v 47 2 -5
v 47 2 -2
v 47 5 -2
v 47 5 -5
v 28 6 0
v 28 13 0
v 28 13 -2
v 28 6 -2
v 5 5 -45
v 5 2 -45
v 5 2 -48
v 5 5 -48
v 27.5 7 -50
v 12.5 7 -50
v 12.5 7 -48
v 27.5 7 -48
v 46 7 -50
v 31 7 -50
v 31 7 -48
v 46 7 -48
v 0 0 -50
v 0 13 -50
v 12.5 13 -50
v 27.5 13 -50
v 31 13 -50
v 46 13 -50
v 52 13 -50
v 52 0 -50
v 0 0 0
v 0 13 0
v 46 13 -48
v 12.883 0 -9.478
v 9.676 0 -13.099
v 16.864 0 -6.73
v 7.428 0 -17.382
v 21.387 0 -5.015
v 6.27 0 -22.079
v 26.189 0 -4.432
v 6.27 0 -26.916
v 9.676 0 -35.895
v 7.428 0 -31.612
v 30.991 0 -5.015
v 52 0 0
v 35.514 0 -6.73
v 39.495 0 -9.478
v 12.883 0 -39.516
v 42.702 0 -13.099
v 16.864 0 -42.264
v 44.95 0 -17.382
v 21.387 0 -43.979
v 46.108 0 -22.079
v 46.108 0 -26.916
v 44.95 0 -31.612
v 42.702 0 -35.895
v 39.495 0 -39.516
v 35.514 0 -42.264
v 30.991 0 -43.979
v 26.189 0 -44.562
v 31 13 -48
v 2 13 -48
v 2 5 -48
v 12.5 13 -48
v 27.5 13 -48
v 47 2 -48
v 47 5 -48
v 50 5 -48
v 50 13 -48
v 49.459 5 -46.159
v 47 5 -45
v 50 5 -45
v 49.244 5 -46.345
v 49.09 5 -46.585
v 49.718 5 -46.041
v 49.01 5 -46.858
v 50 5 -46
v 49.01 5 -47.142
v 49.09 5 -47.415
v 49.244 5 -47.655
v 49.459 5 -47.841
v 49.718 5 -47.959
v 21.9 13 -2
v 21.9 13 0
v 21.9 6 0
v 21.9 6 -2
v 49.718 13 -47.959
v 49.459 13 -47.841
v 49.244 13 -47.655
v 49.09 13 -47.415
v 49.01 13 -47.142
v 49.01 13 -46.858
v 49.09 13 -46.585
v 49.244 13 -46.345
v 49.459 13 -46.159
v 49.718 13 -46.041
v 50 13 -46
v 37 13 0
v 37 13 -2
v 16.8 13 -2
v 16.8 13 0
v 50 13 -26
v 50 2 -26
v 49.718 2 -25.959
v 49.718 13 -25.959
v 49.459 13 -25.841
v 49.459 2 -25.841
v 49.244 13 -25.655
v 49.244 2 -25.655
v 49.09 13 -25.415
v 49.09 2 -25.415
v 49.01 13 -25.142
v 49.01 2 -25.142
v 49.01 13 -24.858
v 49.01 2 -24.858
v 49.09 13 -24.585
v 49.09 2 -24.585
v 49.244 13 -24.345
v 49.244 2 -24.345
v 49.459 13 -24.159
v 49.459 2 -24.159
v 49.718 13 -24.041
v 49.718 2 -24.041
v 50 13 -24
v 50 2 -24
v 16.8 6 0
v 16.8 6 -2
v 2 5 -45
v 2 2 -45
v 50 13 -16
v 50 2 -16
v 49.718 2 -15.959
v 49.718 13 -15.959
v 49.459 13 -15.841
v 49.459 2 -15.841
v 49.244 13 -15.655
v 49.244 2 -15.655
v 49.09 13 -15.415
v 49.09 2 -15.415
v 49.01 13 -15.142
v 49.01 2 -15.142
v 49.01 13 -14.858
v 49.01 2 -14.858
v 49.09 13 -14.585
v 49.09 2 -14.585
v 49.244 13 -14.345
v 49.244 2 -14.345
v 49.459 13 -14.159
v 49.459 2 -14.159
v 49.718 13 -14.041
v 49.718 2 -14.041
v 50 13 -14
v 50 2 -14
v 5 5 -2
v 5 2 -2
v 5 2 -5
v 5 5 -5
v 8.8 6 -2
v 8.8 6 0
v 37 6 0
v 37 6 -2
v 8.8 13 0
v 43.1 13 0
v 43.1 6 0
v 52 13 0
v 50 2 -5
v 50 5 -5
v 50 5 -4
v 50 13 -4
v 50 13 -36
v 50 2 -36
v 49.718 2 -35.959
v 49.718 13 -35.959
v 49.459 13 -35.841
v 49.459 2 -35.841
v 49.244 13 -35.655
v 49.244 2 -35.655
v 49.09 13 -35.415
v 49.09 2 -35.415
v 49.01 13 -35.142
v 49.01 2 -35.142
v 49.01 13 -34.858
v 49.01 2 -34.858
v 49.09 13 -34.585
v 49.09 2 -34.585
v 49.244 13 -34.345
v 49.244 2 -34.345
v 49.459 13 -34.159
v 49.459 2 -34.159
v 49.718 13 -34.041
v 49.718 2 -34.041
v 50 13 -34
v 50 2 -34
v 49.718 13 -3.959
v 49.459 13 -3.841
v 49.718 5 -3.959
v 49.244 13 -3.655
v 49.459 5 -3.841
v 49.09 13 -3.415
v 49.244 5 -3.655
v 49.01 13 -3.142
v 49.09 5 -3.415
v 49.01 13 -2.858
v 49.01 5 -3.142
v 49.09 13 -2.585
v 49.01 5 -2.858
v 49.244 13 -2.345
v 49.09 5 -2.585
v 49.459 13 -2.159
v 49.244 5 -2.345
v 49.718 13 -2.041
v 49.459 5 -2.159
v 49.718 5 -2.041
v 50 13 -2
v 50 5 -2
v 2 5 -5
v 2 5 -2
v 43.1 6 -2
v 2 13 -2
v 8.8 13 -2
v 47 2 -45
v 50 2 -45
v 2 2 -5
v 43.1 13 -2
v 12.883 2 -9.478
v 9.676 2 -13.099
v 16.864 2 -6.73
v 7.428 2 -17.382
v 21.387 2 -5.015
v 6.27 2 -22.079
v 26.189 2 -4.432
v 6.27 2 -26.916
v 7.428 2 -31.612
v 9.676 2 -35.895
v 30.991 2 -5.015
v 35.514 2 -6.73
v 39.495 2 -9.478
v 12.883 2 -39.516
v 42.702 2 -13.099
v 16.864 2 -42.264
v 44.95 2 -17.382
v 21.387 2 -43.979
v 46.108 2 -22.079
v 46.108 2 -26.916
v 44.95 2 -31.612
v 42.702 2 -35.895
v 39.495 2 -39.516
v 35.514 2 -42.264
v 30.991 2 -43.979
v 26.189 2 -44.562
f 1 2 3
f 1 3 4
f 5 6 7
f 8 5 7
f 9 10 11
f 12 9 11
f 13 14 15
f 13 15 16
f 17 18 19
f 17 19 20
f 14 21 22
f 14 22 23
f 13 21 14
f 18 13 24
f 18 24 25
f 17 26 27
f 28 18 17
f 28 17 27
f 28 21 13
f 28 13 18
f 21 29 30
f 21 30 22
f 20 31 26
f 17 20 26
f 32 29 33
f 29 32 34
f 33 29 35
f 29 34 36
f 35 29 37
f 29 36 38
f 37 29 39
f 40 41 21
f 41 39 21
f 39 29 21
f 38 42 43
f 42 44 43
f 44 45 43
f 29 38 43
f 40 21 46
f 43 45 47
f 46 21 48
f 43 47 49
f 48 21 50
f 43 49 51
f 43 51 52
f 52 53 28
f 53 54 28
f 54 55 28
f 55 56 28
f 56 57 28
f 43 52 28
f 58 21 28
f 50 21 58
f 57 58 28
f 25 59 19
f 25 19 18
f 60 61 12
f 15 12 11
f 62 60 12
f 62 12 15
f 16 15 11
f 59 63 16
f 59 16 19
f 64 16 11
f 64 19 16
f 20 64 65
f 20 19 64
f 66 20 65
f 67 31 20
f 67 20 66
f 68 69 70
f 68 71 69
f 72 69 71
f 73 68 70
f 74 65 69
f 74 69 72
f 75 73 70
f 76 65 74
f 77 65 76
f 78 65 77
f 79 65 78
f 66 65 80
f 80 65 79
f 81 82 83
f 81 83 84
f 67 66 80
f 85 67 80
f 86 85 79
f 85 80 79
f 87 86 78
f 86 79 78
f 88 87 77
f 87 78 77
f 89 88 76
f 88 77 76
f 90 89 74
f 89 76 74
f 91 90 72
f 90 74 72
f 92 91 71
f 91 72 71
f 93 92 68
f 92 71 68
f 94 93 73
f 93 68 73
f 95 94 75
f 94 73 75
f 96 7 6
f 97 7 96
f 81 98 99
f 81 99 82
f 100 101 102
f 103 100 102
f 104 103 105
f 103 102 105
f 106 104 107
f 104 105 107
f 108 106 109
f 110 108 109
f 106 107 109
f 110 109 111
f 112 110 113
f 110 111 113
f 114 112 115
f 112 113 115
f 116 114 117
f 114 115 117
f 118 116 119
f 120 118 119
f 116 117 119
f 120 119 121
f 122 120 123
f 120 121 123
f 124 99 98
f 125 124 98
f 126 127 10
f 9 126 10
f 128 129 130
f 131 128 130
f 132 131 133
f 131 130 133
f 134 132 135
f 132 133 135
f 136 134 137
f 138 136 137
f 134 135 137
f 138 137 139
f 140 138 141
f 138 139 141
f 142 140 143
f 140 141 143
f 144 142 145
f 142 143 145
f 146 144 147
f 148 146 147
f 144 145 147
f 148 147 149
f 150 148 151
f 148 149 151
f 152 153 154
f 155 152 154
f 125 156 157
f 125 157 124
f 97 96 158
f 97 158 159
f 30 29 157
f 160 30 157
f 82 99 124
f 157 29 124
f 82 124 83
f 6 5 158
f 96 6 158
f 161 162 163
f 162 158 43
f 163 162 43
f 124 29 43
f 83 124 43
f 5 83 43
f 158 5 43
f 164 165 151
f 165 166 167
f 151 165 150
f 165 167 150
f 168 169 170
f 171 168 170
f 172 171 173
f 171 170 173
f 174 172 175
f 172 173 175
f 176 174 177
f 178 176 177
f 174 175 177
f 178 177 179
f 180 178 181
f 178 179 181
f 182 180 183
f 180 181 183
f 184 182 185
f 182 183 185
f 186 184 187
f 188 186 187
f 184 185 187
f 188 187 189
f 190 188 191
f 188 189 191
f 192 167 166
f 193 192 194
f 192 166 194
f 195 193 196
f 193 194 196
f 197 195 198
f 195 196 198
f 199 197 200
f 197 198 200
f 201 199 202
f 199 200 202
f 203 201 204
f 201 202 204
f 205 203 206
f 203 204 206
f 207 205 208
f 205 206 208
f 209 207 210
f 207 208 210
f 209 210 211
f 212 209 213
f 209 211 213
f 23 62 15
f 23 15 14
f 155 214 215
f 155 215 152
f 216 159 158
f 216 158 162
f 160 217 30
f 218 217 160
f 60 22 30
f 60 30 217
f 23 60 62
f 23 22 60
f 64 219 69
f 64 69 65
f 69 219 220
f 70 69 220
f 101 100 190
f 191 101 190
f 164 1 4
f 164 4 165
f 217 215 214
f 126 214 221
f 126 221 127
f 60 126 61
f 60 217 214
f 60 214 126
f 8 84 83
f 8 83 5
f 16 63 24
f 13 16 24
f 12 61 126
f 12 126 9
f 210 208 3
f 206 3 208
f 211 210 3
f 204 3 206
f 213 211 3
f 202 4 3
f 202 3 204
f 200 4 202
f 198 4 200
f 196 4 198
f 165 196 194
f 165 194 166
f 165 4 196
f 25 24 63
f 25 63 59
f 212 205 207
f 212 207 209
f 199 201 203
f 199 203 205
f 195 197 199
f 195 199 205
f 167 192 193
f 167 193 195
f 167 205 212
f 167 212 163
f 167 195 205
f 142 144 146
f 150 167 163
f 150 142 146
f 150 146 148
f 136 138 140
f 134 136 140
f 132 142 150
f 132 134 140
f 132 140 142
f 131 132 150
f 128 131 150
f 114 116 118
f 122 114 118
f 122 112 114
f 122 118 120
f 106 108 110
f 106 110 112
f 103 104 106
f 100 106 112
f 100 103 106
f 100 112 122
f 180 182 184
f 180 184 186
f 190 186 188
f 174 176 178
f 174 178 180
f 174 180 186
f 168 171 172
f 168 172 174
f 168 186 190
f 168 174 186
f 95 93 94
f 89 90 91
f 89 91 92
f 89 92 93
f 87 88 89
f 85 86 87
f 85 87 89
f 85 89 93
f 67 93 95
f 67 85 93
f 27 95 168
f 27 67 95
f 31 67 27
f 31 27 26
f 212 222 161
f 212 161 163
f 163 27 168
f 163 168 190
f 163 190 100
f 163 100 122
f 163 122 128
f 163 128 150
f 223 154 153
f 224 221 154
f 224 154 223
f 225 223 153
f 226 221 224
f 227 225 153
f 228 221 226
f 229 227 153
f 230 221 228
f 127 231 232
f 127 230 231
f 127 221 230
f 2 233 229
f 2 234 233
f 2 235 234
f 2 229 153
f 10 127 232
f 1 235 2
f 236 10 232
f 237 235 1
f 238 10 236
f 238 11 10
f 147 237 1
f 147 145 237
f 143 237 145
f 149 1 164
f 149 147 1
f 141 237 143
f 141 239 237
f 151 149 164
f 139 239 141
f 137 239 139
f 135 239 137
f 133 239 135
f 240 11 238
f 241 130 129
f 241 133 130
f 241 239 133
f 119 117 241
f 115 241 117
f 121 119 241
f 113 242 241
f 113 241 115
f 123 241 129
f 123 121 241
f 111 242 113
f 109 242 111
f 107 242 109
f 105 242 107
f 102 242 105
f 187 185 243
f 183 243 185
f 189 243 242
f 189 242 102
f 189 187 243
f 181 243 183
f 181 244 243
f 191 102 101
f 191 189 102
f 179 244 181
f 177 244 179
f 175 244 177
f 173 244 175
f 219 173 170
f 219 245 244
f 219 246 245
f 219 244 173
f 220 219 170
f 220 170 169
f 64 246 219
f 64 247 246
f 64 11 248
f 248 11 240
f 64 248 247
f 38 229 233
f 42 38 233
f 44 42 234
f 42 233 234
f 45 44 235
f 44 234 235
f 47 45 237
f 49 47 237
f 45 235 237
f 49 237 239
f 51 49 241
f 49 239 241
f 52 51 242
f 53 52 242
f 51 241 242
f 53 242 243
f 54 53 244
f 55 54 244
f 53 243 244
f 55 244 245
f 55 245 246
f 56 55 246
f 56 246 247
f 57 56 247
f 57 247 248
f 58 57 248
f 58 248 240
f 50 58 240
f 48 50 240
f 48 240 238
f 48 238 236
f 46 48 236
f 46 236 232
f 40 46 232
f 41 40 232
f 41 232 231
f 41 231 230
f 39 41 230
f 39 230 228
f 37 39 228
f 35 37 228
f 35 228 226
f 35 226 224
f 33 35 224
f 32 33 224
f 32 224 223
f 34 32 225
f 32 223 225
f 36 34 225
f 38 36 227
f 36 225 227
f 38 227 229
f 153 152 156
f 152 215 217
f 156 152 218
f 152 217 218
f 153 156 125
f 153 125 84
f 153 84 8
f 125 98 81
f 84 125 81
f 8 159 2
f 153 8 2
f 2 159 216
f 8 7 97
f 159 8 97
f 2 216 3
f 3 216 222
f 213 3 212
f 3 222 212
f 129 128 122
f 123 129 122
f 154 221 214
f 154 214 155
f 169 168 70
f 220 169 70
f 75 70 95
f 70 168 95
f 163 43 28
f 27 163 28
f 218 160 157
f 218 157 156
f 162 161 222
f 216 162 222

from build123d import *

# Parameters (mm, degrees)
SKETCH1_W           = 52
SKETCH1_H           = 50
BOSS_EXTRUDE1_DEPTH = 13
SKETCH2_W           = 48
SKETCH2_H           = 46
CUT_EXTRUDE1_DEPTH  = 11
SKETCH3_W           = 6.1
SKETCH3_H           = 2
SKETCH3_W_2         = 8
CUT_EXTRUDE2_DEPTH  = 7
SKETCH4_W           = 3
SKETCH4_H           = 3
BOSS_EXTRUDE2_DEPTH = 3
SKETCH5_R           = 1
BOSS_EXTRUDE3_DEPTH = 11
SKETCH13_W          = 15
SKETCH13_H          = 2
CUT_EXTRUDE4_DEPTH  = 6
SKETCH12_R          = 20.065170359
CUT_EXTRUDE3_DEPTH  = 10


with BuildPart() as part:
    # Sketch1 → Boss-Extrude1 (new body)
    with BuildSketch(Plane(origin=(0, 0, 0), x_dir=(1, 0, 0), z_dir=(0, 1, 0))):
        with Locations((26, 25)):
            Rectangle(SKETCH1_W, SKETCH1_H)
    extrude(amount=BOSS_EXTRUDE1_DEPTH)

    # Sketch2 → Cut-Extrude1 (cut)
    with BuildSketch(Plane(origin=(0, 13, 0), x_dir=(1, 0, 0), z_dir=(0, 1, 0))):
        with Locations((26, 25)):
            Rectangle(SKETCH2_W, SKETCH2_H)
    extrude(amount=-CUT_EXTRUDE1_DEPTH, mode=Mode.SUBTRACT)

    # Sketch3 → Cut-Extrude2 (cut)
    with BuildSketch(Plane(origin=(0, 13, 0), x_dir=(1, 0, 0), z_dir=(0, 1, 0))):
        with Locations((40.05, 1)):
            Rectangle(SKETCH3_W, SKETCH3_H)
        with Locations((24.95, 1)):
            Rectangle(SKETCH3_W, SKETCH3_H)
        with Locations((12.8, 1)):
            Rectangle(SKETCH3_W_2, SKETCH3_H)
    extrude(amount=-CUT_EXTRUDE2_DEPTH, mode=Mode.SUBTRACT)

    # Sketch4 → Boss-Extrude2 (add)
    with BuildSketch(Plane(origin=(0, 2, 0), x_dir=(1, 0, 0), z_dir=(0, 1, 0))):
        with Locations((3.5, 46.5)):
            Rectangle(SKETCH4_W, SKETCH4_H)
        with Locations((48.5, 46.5)):
            Rectangle(SKETCH4_W, SKETCH4_H)
        with Locations((3.5, 3.5)):
            Rectangle(SKETCH4_W, SKETCH4_H)
        with Locations((48.5, 3.5)):
            Rectangle(SKETCH4_W, SKETCH4_H)
    extrude(amount=BOSS_EXTRUDE2_DEPTH)

    # Sketch5 → Boss-Extrude3 (add)
    with BuildSketch(Plane(origin=(0, 2, 0), x_dir=(1, 0, 0), z_dir=(0, 1, 0))):
        with Locations((50, 35)):
            Circle(SKETCH5_R)
        with Locations((50, 25)):
            Circle(SKETCH5_R)
        with Locations((50, 15)):
            Circle(SKETCH5_R)
        with Locations((50, 47)):
            Circle(SKETCH5_R)
        with Locations((50, 3)):
            Circle(SKETCH5_R)
    extrude(amount=BOSS_EXTRUDE3_DEPTH)

    # Sketch13 → Cut-Extrude4 (cut)
    with BuildSketch(Plane(origin=(0, 13, 0), x_dir=(1, 0, 0), z_dir=(0, 1, 0))):
        with Locations((38.5, 49)):
            Rectangle(SKETCH13_W, SKETCH13_H)
        with Locations((20, 49)):
            Rectangle(SKETCH13_W, SKETCH13_H)
    extrude(amount=-CUT_EXTRUDE4_DEPTH, mode=Mode.SUBTRACT)

    # Sketch12 → Cut-Extrude3 (cut)
    with BuildSketch(Plane(origin=(0, 2, 0), x_dir=(1, 0, 0), z_dir=(0, 1, 0))):
        with Locations(Location((26.189038813, 24.497096503, 0), (0, 0, 270))):
            Circle(SKETCH12_R)
    extrude(amount=-CUT_EXTRUDE3_DEPTH, mode=Mode.SUBTRACT)


solid = part.part
